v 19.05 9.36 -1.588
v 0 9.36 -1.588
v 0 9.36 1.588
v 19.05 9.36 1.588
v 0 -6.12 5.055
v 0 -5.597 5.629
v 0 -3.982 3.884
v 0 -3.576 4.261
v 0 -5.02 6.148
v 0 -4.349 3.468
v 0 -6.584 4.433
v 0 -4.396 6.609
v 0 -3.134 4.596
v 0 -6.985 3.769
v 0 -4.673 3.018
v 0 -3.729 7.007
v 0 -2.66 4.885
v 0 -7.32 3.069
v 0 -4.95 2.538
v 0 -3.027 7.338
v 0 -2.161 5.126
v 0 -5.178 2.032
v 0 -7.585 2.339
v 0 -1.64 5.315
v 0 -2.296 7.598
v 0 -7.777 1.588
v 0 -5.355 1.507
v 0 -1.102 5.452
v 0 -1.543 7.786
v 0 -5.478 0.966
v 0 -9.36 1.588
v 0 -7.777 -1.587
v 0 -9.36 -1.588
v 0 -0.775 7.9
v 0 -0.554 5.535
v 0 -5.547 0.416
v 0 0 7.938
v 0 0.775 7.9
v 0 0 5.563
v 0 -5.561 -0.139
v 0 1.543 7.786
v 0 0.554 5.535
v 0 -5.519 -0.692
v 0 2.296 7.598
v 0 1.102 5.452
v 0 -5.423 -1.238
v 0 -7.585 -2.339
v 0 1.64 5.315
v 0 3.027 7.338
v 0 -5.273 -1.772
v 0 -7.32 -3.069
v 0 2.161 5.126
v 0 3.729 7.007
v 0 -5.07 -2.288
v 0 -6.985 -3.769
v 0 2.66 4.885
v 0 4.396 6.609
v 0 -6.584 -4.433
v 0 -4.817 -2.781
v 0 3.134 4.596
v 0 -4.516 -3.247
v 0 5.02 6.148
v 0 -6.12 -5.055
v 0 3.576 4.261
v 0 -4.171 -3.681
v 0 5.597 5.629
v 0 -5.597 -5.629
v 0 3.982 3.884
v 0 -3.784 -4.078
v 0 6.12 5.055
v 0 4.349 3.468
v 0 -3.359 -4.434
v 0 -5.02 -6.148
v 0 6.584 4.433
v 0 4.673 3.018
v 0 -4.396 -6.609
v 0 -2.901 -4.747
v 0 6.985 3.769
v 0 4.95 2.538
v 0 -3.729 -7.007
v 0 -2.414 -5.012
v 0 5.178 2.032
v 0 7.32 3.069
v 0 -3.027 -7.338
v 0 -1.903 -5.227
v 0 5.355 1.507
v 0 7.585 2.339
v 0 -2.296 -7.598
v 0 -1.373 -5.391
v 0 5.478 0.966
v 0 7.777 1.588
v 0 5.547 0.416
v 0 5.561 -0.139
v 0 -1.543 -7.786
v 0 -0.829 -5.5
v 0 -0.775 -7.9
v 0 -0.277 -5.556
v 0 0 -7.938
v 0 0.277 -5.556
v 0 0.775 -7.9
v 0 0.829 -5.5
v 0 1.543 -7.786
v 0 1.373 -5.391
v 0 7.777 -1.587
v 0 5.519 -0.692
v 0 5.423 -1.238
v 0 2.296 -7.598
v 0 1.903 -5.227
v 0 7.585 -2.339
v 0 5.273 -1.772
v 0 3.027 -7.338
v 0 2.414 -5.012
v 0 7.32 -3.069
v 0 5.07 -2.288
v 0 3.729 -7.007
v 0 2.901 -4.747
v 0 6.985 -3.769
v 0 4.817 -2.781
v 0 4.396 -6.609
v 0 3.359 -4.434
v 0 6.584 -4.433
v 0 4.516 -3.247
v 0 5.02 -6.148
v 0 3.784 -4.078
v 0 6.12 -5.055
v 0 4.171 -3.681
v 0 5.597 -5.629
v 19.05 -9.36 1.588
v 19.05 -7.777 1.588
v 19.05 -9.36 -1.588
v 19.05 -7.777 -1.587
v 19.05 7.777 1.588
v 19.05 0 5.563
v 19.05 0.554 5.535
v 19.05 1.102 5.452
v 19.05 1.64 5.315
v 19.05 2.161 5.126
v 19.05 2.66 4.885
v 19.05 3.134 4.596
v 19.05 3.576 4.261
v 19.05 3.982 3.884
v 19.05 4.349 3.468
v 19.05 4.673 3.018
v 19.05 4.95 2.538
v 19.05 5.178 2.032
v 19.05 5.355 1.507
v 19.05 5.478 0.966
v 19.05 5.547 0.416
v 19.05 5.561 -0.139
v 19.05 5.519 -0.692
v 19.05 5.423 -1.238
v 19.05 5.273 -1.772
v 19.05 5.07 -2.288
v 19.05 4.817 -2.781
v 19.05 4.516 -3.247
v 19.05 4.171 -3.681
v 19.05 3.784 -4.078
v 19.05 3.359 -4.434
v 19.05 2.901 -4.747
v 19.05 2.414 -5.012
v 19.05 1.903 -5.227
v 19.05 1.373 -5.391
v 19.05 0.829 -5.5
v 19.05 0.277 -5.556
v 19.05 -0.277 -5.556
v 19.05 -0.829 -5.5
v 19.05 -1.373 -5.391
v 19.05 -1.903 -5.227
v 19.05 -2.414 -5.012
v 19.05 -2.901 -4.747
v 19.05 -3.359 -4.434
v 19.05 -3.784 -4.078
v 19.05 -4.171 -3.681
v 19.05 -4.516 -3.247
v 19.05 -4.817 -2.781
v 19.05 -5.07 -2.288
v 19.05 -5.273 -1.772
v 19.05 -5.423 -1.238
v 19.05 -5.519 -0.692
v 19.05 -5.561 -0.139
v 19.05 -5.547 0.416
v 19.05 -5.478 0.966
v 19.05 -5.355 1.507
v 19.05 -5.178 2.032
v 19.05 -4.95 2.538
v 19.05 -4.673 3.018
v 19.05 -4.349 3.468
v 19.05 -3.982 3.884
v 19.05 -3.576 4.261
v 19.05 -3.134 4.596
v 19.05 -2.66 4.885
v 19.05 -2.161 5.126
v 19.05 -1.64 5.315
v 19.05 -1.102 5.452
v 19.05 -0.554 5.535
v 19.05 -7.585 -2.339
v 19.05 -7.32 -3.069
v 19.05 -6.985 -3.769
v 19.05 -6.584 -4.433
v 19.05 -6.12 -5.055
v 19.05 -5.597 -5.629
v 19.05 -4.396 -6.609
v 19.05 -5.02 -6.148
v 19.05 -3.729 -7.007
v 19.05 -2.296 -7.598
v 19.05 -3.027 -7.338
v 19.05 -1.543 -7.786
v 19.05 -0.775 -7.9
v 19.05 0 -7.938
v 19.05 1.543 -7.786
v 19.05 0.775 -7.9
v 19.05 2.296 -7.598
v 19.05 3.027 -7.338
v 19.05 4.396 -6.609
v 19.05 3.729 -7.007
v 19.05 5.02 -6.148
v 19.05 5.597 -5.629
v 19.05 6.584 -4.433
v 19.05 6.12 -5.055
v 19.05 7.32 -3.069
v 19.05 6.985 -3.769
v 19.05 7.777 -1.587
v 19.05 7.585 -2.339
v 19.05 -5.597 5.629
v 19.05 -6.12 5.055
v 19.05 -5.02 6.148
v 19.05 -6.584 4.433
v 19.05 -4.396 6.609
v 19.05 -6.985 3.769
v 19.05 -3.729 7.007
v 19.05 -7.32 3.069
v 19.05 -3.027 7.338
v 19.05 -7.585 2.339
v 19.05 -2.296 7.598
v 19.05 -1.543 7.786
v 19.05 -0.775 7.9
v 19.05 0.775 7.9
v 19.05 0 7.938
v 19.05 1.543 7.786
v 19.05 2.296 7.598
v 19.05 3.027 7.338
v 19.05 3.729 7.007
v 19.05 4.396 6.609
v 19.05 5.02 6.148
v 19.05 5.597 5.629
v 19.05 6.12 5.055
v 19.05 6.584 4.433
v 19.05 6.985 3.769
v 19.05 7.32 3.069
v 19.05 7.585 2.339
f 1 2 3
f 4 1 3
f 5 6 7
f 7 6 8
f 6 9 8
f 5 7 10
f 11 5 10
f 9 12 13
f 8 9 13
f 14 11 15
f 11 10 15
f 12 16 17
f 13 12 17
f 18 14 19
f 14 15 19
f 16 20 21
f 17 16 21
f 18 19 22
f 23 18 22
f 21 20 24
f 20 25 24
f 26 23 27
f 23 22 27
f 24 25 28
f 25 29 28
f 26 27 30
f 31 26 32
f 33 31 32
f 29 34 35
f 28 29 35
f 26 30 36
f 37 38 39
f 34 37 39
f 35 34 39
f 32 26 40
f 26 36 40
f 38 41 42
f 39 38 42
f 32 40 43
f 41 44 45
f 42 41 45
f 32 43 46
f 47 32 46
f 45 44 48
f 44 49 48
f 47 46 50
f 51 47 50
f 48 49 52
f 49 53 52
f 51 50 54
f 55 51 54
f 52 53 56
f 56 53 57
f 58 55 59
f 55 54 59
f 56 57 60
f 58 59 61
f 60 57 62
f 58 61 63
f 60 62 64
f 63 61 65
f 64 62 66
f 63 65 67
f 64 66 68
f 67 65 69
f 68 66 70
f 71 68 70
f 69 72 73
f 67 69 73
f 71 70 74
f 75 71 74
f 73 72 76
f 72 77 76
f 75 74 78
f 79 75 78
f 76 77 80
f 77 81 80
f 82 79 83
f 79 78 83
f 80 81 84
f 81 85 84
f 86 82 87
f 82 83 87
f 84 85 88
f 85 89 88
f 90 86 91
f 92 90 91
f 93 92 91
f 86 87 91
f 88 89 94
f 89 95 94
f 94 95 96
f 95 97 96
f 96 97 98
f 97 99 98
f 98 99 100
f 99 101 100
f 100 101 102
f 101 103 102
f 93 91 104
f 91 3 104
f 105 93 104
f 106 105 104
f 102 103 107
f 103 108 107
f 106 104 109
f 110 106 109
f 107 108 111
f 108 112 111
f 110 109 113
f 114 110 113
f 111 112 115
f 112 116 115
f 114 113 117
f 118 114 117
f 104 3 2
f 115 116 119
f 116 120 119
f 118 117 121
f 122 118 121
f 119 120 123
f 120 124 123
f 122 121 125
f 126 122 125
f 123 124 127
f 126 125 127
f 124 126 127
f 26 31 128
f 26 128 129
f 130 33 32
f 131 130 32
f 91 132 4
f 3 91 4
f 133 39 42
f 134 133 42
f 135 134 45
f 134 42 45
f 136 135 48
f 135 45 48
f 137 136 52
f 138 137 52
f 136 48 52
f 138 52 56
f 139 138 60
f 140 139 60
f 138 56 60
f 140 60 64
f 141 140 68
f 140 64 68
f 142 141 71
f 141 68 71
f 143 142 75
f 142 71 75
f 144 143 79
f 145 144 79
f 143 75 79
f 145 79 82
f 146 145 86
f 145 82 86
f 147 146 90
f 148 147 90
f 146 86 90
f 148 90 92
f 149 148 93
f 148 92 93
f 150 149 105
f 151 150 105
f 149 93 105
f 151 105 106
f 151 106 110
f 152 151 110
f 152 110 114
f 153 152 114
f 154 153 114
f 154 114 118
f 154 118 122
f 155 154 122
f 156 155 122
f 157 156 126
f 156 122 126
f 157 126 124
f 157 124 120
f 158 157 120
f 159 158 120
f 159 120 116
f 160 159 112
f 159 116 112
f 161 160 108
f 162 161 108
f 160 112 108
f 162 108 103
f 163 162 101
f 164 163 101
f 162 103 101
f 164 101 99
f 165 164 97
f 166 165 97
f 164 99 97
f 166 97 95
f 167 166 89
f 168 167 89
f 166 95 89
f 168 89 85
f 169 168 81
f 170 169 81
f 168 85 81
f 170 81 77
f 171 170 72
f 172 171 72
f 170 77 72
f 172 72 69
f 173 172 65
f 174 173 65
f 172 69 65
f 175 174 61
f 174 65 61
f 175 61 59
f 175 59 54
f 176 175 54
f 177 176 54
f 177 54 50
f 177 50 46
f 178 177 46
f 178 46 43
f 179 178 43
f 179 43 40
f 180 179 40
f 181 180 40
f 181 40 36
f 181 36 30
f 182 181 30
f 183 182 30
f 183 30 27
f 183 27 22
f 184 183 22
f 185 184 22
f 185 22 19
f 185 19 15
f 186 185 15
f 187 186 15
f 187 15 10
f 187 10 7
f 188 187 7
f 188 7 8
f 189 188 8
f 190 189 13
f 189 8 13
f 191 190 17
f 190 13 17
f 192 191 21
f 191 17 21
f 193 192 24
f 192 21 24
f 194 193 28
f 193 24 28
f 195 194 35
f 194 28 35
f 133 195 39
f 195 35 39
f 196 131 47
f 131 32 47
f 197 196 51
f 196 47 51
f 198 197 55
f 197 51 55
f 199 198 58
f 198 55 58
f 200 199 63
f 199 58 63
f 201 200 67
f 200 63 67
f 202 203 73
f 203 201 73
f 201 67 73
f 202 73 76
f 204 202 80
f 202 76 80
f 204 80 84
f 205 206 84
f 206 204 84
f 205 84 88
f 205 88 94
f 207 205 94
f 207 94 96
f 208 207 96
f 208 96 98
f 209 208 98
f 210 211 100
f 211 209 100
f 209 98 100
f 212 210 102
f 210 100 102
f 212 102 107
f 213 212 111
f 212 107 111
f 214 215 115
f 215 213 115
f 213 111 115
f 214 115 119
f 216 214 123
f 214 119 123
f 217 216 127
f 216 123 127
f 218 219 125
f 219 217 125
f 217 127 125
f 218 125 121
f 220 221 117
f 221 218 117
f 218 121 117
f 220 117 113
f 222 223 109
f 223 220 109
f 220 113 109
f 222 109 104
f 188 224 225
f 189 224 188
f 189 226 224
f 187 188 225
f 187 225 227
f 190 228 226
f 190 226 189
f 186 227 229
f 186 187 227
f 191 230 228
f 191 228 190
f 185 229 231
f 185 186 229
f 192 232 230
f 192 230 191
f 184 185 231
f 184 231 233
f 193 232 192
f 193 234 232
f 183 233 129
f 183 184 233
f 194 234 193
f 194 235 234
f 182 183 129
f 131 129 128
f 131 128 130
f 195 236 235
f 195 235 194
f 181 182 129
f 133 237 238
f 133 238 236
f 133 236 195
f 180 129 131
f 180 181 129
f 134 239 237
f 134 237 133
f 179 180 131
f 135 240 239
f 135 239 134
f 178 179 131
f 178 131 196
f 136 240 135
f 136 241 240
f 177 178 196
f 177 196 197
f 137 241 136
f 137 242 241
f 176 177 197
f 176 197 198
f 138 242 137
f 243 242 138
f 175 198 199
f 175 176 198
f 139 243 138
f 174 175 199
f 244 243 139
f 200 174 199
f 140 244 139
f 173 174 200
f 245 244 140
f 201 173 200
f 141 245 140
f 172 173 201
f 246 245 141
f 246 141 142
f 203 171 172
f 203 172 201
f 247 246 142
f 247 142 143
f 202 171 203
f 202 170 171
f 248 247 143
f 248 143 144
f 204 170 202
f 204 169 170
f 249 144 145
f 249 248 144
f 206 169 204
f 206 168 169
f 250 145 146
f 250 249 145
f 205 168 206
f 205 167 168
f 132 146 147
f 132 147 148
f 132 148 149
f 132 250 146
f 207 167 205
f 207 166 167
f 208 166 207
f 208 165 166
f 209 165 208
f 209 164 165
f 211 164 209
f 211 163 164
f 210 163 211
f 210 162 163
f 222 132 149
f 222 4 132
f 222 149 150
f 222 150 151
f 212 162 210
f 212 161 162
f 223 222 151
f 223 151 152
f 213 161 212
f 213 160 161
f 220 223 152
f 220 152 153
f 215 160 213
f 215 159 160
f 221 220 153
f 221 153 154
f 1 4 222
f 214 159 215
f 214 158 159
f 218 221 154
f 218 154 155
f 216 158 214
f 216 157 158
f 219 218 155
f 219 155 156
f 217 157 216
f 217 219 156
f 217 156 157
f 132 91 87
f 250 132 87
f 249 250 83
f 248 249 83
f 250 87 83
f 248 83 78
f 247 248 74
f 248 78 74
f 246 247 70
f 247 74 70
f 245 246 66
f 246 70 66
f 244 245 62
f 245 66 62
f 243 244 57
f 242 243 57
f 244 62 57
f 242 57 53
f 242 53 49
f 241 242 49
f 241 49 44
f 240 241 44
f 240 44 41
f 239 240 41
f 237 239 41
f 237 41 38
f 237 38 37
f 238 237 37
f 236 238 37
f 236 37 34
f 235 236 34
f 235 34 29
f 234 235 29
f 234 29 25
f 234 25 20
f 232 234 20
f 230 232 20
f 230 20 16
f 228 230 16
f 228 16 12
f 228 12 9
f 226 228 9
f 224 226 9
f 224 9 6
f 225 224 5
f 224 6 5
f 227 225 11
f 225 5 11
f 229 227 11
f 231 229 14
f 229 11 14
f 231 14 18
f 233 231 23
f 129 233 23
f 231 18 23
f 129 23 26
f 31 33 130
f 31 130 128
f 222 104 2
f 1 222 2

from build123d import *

# Parameters (mm, degrees)
SKETCH1_R           = 7.9375
BOSS_EXTRUDE1_DEPTH = 19.05
SKETCH2_W           = 3.175
SKETCH2_H           = 3.446915699
BOSS_EXTRUDE2_DEPTH = 19.05
SKETCH3_R           = 5.5626
CUT_EXTRUDE1_DEPTH  = 19.05


with BuildPart() as part:
    # Sketch1 → Boss-Extrude1 (new body)
    with BuildSketch(Plane(origin=(0, 0, 0), x_dir=(0, 0, -1), z_dir=(1, 0, 0))):
        Circle(SKETCH1_R)
    extrude(amount=BOSS_EXTRUDE1_DEPTH)

    # Sketch2 → Boss-Extrude2 (add)
    with BuildSketch(Plane.ZY):
        with Locations((0, 7.636442151)):
            Rectangle(SKETCH2_W, SKETCH2_H)
        with Locations((0, -7.636442151)):
            Rectangle(SKETCH2_W, SKETCH2_H)
    extrude(amount=-BOSS_EXTRUDE2_DEPTH)

    # Sketch3 → Cut-Extrude1 (cut)
    with BuildSketch(Plane.ZY):
        Circle(SKETCH3_R)
    extrude(amount=-CUT_EXTRUDE1_DEPTH, mode=Mode.SUBTRACT)


solid = part.part
